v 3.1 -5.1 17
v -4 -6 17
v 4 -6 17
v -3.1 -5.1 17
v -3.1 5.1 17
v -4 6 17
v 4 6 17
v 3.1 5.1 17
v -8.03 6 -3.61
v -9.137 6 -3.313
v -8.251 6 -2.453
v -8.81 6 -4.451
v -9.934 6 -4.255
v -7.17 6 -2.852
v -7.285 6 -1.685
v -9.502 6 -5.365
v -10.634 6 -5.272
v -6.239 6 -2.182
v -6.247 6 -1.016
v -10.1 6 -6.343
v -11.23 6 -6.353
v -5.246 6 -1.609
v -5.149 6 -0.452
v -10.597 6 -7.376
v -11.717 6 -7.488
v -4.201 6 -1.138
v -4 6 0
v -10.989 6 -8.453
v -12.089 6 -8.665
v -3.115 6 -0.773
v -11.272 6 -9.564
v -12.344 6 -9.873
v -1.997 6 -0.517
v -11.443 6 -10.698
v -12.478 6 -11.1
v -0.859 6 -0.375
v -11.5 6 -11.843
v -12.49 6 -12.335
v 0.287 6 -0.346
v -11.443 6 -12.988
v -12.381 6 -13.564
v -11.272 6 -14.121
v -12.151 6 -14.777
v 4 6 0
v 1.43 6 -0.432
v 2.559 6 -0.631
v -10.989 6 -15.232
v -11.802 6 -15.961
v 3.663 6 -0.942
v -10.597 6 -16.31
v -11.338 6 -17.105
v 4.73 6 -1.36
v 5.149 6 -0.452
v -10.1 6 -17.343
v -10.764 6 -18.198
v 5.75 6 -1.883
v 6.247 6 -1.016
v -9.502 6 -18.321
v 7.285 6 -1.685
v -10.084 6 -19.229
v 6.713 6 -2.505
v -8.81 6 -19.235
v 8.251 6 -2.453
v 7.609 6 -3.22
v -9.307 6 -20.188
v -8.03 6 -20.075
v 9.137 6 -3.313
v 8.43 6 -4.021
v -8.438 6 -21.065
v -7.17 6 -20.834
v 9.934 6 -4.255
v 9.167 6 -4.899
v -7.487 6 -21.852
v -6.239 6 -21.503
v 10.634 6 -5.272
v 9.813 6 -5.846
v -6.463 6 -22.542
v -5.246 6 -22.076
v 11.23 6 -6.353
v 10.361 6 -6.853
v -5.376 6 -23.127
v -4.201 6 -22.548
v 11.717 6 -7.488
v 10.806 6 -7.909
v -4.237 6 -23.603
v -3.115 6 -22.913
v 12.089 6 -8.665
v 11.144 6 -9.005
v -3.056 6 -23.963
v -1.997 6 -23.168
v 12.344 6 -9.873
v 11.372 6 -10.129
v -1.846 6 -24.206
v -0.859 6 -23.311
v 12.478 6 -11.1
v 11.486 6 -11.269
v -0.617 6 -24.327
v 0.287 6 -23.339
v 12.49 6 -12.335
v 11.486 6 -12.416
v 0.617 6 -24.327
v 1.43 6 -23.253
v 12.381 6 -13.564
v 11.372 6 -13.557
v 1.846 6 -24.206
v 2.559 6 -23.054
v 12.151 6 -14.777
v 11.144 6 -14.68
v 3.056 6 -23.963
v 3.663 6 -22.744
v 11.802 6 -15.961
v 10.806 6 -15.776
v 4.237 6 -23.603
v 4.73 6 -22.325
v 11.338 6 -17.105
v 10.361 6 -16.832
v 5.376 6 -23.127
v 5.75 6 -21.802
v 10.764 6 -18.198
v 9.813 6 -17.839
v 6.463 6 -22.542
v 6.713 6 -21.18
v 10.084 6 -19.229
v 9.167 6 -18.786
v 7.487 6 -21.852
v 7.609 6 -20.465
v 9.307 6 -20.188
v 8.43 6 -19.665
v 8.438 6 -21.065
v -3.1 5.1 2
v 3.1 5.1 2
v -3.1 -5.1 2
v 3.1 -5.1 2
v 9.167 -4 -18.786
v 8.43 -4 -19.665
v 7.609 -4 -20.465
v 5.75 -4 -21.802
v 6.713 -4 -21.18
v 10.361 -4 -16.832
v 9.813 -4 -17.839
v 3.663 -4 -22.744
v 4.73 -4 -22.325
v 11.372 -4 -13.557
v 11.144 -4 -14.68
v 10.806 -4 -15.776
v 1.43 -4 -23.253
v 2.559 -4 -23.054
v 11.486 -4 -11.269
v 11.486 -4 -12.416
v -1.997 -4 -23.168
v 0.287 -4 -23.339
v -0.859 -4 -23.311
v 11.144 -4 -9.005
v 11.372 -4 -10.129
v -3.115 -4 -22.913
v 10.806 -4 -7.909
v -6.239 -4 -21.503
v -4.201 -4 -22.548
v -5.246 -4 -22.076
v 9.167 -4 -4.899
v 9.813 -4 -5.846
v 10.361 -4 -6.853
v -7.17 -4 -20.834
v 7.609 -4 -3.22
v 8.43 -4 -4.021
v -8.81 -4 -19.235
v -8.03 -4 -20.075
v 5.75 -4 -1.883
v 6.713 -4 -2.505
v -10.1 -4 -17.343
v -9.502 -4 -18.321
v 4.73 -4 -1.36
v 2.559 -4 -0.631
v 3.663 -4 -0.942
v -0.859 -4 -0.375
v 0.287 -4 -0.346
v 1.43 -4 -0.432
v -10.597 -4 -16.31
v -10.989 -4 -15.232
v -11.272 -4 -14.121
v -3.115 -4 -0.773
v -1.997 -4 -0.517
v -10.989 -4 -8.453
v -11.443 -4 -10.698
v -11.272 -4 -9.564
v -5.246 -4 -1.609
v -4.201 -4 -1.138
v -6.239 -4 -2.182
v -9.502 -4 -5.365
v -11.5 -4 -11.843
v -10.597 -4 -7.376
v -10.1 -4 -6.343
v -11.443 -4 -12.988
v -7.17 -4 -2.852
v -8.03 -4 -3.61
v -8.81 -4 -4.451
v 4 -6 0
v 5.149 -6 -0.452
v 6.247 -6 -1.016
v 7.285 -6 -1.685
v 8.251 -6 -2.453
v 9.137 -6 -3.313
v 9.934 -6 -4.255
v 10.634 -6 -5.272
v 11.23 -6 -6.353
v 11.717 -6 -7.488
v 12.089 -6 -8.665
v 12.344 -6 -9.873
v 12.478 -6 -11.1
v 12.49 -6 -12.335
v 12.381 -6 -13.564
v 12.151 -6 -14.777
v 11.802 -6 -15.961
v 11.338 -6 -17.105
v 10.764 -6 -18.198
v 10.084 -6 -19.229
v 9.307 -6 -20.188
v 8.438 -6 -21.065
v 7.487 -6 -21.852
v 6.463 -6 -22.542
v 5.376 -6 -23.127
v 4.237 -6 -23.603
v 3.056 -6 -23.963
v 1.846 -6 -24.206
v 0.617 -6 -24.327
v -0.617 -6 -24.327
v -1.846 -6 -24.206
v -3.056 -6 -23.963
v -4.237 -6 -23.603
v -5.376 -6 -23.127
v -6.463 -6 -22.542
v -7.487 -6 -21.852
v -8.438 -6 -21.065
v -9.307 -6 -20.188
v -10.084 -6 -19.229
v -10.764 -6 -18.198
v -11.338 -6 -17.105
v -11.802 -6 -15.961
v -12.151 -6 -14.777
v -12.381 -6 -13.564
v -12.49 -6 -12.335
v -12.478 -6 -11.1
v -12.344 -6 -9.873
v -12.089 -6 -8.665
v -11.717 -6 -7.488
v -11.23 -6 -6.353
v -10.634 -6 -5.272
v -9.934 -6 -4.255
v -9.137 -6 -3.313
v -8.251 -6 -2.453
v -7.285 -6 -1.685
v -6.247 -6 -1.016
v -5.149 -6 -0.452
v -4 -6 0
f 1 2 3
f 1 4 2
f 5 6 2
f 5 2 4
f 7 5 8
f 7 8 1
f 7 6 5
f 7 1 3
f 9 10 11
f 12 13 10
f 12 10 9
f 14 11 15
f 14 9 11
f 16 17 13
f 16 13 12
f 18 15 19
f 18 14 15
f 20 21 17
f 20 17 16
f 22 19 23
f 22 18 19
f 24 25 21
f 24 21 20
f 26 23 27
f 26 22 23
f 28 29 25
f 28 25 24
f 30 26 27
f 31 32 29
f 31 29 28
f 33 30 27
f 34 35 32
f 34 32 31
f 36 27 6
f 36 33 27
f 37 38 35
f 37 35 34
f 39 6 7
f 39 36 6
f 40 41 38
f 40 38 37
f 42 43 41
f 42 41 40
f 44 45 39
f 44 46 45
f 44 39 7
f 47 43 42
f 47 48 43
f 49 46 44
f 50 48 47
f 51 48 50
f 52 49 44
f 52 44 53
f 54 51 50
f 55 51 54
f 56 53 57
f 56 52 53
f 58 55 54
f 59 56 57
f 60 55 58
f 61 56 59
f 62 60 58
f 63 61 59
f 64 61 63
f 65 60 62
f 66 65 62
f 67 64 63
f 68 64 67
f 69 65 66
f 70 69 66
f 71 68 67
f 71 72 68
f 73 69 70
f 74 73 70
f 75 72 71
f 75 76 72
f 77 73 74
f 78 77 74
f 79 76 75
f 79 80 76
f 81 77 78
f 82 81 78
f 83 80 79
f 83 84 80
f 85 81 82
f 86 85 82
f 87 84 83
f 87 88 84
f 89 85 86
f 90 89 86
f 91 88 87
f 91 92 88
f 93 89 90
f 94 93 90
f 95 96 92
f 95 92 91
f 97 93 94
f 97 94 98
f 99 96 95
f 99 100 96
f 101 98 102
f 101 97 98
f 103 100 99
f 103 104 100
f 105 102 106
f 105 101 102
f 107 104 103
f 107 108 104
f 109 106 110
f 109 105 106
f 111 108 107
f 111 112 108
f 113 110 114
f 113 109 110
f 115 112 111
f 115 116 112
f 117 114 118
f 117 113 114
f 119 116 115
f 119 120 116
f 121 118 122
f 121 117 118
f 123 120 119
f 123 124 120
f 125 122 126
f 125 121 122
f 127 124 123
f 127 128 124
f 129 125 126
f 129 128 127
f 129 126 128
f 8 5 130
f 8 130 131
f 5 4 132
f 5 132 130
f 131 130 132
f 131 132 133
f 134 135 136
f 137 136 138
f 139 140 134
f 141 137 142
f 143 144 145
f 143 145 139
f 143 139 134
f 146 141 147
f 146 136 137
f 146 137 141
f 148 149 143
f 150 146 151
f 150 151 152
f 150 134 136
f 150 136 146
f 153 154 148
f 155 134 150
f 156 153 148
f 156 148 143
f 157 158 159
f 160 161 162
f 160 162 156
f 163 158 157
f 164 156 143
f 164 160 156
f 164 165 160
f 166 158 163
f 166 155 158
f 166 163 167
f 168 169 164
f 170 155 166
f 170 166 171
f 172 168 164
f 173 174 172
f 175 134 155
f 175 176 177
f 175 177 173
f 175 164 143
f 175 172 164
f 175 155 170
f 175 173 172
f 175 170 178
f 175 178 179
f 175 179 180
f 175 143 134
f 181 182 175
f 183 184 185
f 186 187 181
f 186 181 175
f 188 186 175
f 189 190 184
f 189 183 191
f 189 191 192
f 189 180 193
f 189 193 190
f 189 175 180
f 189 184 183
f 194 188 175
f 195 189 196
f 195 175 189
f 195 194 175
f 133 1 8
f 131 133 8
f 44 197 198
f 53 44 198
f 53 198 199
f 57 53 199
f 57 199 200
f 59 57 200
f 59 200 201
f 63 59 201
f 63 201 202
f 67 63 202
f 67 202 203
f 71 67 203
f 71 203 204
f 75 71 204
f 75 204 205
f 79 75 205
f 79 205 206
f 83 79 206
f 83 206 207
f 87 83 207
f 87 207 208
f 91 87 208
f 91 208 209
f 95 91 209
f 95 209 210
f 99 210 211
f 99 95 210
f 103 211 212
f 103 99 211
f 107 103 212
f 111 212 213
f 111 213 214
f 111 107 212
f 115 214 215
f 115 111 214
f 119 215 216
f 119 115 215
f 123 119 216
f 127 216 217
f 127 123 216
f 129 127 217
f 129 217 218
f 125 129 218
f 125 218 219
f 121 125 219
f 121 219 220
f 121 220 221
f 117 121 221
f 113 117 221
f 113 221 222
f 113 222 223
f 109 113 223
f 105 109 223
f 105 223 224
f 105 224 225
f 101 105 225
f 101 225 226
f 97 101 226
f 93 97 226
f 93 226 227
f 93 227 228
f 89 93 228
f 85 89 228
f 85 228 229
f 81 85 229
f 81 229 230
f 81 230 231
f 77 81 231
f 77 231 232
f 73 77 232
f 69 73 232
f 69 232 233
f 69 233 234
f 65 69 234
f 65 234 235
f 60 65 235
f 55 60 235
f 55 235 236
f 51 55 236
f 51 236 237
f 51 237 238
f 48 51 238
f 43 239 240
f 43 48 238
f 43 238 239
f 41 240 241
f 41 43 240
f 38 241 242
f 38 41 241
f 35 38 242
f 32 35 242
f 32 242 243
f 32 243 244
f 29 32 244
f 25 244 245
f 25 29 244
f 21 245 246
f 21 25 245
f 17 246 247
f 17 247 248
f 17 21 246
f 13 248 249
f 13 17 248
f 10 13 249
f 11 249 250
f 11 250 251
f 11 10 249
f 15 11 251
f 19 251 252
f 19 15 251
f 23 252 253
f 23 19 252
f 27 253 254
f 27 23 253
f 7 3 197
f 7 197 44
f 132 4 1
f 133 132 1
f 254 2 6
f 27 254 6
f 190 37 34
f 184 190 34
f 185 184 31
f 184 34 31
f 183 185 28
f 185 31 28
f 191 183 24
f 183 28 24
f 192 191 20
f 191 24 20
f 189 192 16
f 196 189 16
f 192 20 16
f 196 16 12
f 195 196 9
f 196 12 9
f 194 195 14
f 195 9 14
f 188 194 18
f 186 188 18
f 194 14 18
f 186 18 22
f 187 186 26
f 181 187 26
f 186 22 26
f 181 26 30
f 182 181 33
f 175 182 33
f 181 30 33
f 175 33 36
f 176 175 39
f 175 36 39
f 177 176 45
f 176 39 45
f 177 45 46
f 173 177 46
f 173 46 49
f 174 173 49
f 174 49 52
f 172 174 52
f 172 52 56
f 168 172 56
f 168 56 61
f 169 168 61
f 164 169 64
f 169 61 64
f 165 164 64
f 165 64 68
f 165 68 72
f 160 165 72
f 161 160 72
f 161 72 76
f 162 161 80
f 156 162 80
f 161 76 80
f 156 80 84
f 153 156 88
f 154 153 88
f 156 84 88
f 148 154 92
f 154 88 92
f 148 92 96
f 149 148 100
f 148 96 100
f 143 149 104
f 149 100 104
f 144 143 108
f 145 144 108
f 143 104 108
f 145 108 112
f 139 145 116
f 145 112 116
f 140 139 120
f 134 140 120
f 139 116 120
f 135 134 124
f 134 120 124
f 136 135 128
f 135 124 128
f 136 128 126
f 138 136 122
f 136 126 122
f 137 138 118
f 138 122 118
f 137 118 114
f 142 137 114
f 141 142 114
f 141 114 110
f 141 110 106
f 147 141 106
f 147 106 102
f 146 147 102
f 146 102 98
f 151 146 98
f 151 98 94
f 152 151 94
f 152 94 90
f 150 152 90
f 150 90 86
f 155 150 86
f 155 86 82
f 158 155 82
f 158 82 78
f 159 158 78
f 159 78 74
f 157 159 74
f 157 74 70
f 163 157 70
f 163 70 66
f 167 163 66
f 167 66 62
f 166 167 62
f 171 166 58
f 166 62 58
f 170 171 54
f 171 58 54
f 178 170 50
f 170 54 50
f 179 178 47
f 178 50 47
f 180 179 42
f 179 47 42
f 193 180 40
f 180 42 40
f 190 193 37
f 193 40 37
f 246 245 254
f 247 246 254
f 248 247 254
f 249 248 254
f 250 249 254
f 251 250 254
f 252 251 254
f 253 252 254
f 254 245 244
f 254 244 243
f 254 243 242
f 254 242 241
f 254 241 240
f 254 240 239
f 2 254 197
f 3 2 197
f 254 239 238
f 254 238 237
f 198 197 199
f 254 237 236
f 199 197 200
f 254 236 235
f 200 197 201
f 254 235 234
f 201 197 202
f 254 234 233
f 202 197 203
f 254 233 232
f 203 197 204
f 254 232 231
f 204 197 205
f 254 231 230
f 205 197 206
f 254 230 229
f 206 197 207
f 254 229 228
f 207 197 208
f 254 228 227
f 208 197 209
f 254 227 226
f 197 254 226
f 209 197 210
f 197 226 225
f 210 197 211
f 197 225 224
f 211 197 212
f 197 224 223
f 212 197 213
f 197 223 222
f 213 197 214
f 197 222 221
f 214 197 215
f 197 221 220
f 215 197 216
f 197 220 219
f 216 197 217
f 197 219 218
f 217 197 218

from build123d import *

# Parameters (mm, degrees)
ESBO_O2_W                = 8
ESBO_O2_H                = 12
RESSALTO_EXTRUS_O1_DEPTH = 17
ESBO_O3_W                = 6.2
ESBO_O3_H                = 10.2
CORTE_EXTRUS_O1_DEPTH    = 15
ESBO_O4_R                = 12.5
RESSALTO_EXTRUS_O2_DEPTH = 12
ESBO_O5_R                = 11.5
CORTE_EXTRUS_O2_DEPTH    = 10


with BuildPart() as part:
    # Esboço2 → Ressalto-extrusão1 (new body)
    with BuildSketch(Plane.XY):
        Rectangle(ESBO_O2_W, ESBO_O2_H)
    extrude(amount=RESSALTO_EXTRUS_O1_DEPTH)

    # Esboço3 → Corte-extrusão1 (cut)
    with BuildSketch(Plane.XY.offset(17)):
        Rectangle(ESBO_O3_W, ESBO_O3_H)
    extrude(amount=-CORTE_EXTRUS_O1_DEPTH, mode=Mode.SUBTRACT)

    # Esboço4 → Ressalto-extrusão2 (add)
    with BuildSketch(Plane(origin=(0, 6, 0), x_dir=(1, 0, 0), z_dir=(0, 1, 0))):
        with Locations((0, 11.842719282)):
            Circle(ESBO_O4_R)
    extrude(amount=-RESSALTO_EXTRUS_O2_DEPTH)

    # Esboço5 → Corte-extrusão2 (cut)
    with BuildSketch(Plane(origin=(0, 6, 0), x_dir=(1, 0, 0), z_dir=(0, 1, 0))):
        with Locations(Location((0, 11.842719282, 0), (0, 0, 180))):
            Circle(ESBO_O5_R)
    extrude(amount=-CORTE_EXTRUS_O2_DEPTH, mode=Mode.SUBTRACT)


solid = part.part
